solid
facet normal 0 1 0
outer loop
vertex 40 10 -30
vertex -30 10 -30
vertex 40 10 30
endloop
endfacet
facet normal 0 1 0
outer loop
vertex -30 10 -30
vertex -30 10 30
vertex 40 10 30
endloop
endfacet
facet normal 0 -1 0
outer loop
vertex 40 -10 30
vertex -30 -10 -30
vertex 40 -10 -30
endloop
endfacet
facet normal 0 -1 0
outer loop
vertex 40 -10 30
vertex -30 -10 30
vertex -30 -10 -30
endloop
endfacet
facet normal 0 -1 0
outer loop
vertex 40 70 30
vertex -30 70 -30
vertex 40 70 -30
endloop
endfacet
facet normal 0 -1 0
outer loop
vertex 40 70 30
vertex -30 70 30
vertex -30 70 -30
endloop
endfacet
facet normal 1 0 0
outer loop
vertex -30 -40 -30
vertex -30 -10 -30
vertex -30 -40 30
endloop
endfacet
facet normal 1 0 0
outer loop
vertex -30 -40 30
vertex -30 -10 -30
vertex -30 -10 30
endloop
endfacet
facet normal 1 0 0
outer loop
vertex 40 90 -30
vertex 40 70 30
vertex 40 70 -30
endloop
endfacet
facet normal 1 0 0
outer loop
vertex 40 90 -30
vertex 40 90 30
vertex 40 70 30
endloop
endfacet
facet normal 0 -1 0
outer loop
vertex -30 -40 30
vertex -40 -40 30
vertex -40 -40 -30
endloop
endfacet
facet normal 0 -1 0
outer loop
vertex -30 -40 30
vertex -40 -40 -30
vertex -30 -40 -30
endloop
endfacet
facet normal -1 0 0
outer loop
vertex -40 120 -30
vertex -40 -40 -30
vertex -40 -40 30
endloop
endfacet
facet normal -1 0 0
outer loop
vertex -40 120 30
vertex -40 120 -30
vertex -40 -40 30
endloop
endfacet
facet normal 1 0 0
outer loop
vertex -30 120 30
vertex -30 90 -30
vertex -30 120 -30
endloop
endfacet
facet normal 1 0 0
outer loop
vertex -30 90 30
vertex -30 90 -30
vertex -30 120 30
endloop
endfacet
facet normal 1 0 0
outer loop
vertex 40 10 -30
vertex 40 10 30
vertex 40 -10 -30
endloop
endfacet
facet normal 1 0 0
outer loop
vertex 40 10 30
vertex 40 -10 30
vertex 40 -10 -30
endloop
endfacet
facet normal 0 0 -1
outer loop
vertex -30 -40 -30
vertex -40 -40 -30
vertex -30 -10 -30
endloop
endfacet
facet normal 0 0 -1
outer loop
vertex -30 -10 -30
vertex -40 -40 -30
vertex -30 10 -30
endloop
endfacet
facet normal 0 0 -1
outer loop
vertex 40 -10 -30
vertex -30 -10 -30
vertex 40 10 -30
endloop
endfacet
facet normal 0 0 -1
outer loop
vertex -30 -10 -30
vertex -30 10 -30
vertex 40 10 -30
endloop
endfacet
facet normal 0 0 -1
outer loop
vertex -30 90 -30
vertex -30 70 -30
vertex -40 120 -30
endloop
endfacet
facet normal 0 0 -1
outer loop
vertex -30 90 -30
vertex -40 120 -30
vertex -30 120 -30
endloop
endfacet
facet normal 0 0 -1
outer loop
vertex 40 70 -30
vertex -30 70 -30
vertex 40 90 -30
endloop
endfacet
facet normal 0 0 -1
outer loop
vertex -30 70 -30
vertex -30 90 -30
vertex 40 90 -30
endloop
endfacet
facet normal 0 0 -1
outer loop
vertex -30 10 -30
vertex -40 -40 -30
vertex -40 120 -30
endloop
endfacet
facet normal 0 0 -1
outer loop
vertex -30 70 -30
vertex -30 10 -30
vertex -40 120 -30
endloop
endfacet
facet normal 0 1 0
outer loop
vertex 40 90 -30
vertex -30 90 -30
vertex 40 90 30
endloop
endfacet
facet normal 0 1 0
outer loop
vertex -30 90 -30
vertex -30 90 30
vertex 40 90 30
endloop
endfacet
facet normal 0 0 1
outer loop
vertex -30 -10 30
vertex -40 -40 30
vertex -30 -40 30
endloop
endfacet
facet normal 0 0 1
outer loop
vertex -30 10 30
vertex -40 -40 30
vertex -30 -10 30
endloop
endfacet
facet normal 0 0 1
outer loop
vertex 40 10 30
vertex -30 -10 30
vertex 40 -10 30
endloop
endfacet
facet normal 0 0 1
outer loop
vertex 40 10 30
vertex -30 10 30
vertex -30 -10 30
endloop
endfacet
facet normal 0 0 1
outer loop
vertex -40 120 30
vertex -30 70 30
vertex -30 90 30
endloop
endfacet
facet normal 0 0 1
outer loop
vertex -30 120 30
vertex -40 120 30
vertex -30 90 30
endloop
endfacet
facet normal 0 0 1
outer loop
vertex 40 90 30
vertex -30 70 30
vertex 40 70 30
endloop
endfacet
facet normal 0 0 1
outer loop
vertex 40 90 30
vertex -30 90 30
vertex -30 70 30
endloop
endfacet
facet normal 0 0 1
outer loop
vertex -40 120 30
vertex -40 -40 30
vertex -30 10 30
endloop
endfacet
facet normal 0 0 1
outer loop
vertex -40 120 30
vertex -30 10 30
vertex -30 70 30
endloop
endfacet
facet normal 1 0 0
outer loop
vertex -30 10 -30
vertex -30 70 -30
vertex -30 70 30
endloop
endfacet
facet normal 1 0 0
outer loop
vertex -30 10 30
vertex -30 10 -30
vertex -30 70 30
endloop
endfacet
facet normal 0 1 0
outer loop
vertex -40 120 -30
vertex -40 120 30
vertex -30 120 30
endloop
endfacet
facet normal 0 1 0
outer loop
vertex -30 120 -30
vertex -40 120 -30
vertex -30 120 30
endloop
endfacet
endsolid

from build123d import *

# Parameters (mm, degrees)
F1_DEPTH = 10
F2_W     = 10
F2_H     = 60
F3_DEPTH = 30


with BuildPart() as f1:
    # F0 (on Front) → F1 (new body)
    with BuildSketch(Plane.XZ):
        Polygon((40, 0), (10, 30), (-40, 30), (-40, -30), (40, -30), align=None)
    extrude(amount=F1_DEPTH)

    # F2 (on face) → F3 (join)
    with BuildSketch(Plane.XZ.offset(10)):
        with Locations((-35, 0)):
            Rectangle(F2_W, F2_H)
    extrude(amount=F3_DEPTH)

    # F4: F1 across plane


with BuildPart() as f1_1:
    add(f1.part)
    add(f1.part.mirror(Plane.XY))

    # F5: F1 across face


with BuildPart() as f1_2:
    add(f1_1.part)
    add(f1_1.part.mirror(Plane(origin=(0, 0, 0), x_dir=(-1, 0, 0), z_dir=(0, 1, 0))))

    # F6: F1 across face


with BuildPart() as f1_3:
    add(f1_2.part)
    add(f1_2.part.mirror(Plane(origin=(-35, 40, 0), x_dir=(-1, 0, 0), z_dir=(0, 1, 0))))


solid = f1_3.part
